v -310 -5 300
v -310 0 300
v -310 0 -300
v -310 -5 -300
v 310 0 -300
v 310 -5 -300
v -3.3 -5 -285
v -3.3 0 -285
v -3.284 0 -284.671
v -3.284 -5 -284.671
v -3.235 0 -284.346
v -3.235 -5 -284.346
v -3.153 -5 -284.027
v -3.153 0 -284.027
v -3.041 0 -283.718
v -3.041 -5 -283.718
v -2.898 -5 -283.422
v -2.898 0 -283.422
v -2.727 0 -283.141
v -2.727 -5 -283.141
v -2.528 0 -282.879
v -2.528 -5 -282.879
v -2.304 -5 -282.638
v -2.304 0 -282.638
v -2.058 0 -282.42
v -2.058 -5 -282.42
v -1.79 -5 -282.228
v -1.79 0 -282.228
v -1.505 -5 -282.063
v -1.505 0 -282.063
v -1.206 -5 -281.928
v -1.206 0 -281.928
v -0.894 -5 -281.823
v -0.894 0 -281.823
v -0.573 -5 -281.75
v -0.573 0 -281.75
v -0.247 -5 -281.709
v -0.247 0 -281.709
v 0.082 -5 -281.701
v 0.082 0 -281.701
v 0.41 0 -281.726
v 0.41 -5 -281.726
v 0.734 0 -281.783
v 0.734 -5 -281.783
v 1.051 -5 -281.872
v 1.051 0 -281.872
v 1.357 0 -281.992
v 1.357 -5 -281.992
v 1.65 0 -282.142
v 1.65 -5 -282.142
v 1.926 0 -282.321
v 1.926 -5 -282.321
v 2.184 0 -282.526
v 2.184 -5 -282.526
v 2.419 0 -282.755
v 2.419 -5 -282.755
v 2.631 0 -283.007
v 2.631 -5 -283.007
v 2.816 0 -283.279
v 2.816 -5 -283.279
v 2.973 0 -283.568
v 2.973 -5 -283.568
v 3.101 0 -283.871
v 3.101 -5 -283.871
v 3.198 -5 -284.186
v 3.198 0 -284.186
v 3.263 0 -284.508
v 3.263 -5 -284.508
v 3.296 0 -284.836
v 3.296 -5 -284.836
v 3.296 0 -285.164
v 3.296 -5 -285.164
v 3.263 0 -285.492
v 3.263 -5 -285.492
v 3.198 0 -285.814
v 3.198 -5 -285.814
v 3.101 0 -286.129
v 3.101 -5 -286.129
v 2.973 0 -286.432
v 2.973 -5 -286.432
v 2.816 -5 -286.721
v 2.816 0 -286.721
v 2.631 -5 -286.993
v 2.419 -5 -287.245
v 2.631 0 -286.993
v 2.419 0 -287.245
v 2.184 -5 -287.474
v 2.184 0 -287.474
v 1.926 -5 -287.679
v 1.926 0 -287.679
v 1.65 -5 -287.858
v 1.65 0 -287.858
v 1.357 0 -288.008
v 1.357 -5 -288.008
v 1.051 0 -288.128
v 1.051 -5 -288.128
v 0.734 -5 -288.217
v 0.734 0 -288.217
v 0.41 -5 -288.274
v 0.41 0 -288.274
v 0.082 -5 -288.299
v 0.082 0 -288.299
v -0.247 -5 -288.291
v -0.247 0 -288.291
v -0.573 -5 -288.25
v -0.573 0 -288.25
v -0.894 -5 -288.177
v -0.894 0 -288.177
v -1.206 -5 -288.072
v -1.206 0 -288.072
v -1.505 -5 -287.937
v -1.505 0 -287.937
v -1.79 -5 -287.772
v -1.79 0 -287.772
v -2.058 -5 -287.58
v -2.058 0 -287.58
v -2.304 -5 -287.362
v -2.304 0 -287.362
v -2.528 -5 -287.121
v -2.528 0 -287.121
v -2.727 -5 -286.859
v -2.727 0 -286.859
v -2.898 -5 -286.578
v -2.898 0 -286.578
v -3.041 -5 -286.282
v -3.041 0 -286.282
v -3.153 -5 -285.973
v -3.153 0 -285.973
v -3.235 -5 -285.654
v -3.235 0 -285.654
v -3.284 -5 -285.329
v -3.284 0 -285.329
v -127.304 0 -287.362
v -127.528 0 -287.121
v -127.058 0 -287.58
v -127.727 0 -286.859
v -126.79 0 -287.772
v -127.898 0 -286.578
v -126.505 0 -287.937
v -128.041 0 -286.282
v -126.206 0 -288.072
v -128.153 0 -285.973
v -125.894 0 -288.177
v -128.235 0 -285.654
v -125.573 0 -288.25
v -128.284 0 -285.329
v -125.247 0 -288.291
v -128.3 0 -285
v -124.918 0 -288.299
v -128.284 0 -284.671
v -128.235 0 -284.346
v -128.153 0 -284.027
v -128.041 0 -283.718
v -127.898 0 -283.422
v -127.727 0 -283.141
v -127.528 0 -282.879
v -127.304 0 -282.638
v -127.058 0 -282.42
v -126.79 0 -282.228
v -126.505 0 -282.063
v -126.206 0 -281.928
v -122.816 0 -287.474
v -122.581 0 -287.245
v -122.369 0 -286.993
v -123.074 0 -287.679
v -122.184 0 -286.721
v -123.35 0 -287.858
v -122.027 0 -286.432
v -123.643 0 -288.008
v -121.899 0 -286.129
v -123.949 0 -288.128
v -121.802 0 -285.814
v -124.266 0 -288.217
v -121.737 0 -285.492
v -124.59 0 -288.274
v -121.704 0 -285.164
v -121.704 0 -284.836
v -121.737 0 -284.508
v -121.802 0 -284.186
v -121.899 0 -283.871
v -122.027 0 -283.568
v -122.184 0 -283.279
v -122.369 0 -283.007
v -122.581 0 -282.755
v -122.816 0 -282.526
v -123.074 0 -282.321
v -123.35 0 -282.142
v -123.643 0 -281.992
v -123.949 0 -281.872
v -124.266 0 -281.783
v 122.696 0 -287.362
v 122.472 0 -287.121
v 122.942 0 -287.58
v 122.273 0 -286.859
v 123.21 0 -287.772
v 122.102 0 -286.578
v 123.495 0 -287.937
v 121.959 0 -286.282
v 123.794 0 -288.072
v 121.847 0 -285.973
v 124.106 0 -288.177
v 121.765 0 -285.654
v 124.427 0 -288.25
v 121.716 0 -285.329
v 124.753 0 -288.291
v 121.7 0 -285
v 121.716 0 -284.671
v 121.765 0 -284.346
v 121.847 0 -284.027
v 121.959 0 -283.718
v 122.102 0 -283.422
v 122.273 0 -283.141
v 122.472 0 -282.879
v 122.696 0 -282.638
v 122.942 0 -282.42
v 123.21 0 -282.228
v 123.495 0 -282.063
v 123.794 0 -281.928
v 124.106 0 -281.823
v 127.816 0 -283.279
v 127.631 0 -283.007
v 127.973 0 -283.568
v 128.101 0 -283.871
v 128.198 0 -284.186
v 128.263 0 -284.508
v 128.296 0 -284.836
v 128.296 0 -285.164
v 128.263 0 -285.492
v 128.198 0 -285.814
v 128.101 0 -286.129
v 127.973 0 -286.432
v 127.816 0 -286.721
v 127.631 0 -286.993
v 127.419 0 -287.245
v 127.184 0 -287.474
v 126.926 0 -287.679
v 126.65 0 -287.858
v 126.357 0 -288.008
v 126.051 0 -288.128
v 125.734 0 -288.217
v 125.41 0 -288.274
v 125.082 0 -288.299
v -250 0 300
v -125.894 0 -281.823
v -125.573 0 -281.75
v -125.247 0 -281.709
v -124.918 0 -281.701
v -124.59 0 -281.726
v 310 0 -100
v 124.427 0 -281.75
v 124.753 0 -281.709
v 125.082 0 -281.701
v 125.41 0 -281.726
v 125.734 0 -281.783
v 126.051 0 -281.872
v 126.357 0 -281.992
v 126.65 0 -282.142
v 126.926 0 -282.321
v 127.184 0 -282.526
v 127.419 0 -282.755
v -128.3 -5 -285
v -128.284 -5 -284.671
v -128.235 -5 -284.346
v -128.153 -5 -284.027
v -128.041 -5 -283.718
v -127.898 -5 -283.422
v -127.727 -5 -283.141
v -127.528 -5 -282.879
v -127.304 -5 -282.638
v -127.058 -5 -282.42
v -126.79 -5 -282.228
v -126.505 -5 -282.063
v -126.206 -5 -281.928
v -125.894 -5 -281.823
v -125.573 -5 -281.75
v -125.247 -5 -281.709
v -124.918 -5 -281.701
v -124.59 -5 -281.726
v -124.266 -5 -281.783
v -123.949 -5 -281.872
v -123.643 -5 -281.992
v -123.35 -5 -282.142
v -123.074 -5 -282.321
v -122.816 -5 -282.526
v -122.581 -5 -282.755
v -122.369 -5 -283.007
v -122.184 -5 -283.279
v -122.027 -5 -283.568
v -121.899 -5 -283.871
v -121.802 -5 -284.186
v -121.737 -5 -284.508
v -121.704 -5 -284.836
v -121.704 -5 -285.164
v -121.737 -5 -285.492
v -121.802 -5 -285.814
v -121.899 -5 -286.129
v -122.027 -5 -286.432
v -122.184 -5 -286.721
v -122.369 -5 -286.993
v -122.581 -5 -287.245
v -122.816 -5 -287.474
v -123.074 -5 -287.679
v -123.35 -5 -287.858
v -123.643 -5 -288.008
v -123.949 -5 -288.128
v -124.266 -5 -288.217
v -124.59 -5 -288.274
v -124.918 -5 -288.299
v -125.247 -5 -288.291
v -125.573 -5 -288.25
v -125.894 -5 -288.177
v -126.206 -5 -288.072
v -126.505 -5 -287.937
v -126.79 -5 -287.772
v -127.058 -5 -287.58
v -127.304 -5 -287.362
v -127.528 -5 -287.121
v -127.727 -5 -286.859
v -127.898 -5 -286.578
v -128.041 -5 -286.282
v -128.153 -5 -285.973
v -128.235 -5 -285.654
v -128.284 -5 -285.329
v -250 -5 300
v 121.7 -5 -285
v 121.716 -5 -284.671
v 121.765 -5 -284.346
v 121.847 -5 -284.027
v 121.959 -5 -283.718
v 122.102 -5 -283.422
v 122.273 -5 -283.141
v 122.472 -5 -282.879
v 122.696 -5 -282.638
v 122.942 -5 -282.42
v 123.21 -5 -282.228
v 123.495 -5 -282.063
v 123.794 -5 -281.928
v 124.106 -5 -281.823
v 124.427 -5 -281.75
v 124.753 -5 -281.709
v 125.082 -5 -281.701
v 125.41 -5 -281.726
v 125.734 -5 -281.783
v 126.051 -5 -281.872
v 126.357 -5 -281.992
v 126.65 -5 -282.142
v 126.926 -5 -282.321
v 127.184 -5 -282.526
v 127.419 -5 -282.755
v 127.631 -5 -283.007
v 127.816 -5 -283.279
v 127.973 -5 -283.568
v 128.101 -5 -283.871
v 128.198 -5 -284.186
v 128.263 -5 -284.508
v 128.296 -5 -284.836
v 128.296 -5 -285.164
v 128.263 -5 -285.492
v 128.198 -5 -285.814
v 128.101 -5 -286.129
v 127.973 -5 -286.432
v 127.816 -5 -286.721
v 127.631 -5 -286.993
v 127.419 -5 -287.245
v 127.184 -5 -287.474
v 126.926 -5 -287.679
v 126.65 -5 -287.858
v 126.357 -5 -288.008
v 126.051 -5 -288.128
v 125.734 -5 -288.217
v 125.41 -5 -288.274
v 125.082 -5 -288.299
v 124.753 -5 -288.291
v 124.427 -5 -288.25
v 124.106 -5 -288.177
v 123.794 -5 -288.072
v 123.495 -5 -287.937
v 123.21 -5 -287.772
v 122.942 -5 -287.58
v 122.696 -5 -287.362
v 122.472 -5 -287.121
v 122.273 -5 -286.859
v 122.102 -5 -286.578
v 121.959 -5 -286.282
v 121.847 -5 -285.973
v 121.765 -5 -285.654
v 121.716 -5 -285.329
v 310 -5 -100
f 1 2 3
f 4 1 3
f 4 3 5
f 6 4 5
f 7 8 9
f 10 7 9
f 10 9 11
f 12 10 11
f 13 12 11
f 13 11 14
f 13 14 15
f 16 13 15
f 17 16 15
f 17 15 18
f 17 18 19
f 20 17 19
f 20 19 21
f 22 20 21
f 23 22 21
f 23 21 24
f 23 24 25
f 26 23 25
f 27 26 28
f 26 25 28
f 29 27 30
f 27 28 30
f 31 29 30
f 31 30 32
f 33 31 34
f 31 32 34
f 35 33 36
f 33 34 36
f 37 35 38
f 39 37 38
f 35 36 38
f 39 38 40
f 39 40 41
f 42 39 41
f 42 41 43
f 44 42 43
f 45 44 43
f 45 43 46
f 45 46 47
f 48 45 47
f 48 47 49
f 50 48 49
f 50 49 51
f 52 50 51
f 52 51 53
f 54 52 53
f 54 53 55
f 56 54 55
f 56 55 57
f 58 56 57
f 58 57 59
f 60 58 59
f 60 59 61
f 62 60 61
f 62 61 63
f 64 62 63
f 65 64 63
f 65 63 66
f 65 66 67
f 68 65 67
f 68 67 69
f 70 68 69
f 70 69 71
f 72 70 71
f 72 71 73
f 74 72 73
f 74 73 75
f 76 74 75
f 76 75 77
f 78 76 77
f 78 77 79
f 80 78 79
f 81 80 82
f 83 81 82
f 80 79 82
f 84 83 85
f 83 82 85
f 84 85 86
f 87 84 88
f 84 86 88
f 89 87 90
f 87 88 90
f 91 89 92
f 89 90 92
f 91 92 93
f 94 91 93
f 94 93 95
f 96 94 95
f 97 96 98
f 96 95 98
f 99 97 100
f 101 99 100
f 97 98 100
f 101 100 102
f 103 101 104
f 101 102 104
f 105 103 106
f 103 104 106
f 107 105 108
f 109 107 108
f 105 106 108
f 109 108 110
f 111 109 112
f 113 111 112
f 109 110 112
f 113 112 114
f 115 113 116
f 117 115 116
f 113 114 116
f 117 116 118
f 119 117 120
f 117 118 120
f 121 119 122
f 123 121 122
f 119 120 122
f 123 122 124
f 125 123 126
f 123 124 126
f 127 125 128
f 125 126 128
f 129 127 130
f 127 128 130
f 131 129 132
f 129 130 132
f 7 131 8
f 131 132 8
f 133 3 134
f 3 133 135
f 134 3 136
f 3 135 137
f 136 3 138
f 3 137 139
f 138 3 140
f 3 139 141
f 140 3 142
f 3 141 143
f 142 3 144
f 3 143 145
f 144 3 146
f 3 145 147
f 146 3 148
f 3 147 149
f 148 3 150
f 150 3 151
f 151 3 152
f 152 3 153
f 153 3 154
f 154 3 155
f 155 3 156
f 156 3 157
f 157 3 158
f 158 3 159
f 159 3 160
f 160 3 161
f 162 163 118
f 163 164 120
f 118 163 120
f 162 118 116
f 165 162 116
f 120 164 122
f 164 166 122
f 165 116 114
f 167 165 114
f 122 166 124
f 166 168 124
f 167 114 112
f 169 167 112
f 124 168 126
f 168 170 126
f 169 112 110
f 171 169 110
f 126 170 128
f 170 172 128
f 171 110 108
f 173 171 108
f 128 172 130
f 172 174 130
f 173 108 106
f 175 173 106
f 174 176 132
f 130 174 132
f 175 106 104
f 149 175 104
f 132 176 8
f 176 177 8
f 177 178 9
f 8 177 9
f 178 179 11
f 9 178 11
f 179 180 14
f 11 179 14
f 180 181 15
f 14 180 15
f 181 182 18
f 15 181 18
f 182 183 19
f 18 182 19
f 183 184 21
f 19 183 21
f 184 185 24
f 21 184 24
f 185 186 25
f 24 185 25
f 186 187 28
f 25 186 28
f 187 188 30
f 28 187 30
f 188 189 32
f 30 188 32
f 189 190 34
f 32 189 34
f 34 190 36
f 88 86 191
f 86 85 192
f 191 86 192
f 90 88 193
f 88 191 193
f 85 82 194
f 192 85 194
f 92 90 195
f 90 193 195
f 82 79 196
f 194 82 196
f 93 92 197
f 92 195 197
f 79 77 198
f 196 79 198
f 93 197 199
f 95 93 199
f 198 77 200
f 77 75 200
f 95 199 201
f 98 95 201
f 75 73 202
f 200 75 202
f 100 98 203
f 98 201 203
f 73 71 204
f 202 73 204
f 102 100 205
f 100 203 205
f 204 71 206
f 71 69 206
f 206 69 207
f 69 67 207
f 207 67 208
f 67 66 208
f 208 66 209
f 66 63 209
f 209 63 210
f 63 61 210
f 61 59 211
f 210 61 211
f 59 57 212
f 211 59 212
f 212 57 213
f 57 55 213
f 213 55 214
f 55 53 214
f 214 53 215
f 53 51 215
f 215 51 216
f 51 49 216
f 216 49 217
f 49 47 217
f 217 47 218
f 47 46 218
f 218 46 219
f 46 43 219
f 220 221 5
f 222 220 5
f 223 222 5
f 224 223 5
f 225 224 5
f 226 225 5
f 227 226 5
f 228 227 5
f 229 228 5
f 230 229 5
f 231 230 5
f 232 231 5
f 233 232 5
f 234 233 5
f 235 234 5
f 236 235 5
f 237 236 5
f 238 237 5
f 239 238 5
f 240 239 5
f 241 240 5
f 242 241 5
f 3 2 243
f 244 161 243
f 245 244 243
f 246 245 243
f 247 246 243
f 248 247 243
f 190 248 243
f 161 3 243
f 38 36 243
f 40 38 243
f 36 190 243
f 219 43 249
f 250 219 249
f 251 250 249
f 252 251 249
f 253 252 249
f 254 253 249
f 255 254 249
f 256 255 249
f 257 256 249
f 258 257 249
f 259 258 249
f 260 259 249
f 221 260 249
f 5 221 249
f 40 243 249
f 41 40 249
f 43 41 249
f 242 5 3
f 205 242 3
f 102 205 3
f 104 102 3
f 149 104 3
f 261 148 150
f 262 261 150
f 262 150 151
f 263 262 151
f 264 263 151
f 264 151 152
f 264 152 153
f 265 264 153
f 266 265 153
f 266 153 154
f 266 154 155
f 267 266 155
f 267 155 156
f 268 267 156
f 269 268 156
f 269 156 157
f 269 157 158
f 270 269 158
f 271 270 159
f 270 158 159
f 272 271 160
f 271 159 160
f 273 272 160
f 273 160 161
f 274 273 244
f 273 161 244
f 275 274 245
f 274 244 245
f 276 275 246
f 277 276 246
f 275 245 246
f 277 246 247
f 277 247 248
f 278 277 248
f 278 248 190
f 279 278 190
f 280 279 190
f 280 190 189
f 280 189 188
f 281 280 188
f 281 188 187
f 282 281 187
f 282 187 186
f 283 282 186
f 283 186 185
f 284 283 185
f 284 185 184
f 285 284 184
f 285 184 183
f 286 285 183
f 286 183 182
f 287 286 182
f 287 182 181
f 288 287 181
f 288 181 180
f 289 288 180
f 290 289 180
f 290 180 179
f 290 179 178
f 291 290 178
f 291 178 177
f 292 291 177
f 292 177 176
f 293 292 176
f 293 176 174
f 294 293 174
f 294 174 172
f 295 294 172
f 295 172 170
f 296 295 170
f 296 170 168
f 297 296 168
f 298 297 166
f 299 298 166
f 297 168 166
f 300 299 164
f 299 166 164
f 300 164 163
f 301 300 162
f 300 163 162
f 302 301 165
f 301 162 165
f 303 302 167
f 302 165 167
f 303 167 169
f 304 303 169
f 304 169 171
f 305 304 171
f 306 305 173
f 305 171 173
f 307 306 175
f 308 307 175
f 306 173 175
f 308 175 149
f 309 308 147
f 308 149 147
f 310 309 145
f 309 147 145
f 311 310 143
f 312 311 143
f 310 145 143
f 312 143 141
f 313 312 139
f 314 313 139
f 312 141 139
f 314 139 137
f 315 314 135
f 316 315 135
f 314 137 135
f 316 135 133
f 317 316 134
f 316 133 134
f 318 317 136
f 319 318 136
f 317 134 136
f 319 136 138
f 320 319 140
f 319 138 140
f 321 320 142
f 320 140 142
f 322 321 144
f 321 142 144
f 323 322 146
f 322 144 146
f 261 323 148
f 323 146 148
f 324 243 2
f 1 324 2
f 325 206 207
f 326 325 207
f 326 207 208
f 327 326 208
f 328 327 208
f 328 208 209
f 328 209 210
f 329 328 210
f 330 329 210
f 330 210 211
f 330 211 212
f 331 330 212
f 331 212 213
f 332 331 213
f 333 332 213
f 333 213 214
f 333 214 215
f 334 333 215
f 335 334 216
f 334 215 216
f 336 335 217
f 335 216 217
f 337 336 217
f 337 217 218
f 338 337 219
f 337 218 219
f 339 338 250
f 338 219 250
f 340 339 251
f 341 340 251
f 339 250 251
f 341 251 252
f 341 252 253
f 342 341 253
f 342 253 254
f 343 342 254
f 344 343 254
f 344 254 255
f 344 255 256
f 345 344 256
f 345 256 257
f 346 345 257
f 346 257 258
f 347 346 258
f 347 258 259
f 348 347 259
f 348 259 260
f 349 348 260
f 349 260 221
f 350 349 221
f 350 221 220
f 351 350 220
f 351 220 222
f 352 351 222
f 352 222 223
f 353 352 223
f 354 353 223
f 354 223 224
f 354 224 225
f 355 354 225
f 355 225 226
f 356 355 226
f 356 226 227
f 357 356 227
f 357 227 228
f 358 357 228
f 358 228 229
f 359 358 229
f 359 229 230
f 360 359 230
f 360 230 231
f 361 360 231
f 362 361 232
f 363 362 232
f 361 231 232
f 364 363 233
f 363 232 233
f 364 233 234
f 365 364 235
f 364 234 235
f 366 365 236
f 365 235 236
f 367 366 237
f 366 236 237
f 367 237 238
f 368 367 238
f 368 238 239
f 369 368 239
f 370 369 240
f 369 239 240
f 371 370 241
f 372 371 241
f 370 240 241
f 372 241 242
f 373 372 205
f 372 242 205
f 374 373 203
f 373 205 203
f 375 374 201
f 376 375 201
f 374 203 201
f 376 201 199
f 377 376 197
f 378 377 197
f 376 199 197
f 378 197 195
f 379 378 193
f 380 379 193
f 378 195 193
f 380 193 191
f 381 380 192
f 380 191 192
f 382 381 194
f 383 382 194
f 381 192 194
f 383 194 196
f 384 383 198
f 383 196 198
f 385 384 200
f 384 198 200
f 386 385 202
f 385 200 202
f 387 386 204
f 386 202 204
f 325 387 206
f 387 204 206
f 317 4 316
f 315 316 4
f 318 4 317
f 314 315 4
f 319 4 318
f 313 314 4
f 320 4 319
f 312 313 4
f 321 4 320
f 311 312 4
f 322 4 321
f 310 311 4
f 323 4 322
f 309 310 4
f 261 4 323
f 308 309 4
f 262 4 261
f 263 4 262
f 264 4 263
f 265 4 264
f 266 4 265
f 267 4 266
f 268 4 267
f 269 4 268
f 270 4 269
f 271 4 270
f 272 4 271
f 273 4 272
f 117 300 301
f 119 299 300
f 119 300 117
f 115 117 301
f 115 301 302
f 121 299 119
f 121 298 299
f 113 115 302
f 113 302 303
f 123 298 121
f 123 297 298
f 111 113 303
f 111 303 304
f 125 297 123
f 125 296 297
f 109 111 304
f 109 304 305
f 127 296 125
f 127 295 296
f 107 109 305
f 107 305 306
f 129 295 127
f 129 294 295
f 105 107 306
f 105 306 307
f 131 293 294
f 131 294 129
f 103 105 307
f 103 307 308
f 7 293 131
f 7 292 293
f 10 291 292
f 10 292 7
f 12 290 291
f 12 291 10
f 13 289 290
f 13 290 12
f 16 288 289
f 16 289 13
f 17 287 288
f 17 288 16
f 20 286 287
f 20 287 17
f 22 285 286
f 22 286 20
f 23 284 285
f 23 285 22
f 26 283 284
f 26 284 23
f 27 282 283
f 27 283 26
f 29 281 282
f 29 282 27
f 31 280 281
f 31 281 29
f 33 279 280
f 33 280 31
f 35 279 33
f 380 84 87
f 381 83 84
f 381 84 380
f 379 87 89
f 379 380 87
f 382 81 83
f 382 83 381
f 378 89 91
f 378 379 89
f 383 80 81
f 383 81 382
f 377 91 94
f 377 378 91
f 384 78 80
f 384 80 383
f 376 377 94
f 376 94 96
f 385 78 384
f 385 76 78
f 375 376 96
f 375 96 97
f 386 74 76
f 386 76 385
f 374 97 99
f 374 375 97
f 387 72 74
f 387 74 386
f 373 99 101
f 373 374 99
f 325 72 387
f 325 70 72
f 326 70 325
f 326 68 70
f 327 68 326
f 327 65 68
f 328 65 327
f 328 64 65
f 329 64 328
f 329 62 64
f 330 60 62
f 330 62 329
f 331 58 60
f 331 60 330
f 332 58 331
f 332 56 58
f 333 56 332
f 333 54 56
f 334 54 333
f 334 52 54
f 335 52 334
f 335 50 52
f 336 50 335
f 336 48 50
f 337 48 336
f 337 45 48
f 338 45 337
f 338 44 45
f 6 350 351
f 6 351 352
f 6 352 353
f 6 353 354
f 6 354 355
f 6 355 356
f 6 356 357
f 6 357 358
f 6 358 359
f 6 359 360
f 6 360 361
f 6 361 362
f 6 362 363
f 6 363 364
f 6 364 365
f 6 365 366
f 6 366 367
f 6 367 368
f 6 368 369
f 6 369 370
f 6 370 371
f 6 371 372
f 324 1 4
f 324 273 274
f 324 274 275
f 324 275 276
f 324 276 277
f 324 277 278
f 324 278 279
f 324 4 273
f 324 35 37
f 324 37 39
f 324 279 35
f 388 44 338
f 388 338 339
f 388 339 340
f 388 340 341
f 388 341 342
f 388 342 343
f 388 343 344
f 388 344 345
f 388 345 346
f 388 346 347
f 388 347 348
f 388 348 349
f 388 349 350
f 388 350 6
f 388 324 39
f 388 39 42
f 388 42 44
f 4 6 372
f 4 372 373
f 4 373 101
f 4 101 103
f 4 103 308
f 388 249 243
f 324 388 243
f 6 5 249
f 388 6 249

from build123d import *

# Parameters (mm, degrees)
F1_DEPTH = 5
F3_D     = 6.6


with BuildPart() as f1:
    # F0 (on Front) → F1 (new body)
    with BuildSketch(Plane.XZ):
        Polygon((-250, 300), (-310, 300), (-310, -300), (310, -300), (310, -100), align=None)
    extrude(amount=F1_DEPTH)

    # F3 (through all)
    with Locations(Plane.XZ.offset(5)):
        with Locations((-125, -285), (0, -285), (125, -285)):
            Hole(F3_D / 2)


solid = f1.part
